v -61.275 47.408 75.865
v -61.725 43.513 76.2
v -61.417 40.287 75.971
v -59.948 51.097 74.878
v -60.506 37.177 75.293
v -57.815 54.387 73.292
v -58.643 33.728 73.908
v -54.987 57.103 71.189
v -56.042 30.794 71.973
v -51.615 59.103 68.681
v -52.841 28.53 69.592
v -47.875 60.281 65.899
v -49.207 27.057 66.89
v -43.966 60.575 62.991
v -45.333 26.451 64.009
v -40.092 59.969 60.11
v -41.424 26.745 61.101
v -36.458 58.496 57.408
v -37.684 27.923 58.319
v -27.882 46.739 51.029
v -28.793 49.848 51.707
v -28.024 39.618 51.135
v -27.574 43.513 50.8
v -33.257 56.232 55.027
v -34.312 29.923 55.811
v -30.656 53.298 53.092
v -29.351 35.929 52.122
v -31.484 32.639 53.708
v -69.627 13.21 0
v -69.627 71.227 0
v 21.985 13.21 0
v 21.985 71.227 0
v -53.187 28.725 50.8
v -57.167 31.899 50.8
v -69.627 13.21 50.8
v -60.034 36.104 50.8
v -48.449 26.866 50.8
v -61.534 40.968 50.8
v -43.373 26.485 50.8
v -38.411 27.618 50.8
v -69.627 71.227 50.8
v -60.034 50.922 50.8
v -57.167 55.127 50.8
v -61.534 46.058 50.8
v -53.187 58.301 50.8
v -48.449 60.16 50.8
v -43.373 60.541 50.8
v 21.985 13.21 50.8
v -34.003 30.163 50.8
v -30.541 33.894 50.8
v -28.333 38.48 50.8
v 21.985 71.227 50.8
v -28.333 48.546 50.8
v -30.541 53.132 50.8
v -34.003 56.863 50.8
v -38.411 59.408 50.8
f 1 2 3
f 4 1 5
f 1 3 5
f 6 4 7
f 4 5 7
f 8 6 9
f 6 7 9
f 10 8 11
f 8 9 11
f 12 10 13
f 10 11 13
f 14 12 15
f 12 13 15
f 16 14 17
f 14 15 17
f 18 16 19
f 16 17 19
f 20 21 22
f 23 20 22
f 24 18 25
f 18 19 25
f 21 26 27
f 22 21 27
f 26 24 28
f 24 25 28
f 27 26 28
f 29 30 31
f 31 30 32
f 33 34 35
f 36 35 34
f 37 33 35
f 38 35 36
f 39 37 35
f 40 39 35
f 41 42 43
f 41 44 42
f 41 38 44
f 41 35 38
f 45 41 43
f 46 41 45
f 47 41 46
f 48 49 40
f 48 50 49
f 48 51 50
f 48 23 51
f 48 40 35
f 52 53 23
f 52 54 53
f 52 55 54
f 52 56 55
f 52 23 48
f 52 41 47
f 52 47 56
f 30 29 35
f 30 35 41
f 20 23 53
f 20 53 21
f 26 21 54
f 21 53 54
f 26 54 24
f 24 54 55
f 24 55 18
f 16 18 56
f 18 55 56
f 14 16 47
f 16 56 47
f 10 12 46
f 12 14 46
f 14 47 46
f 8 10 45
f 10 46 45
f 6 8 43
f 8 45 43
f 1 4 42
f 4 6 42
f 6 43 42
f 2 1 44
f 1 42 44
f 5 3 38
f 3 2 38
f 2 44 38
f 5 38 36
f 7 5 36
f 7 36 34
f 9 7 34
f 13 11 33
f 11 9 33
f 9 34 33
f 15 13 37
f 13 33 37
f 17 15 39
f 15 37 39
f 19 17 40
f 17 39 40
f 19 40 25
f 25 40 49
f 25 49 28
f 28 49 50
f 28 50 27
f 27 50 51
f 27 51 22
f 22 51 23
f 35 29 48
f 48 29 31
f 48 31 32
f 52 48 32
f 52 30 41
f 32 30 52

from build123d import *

# Parameters (mm, degrees)
F0_W     = 91.6122980416
F0_H     = 58.0168142915
F1_DEPTH = 50.8
F2_R     = 17.0754278952
F3_DEPTH = 25.4
F4_DEPTH = 50.8
F6_DEPTH = 58.0178142915


with BuildPart() as f1:
    # F0 (on Top) → F1 (new body)
    with BuildSketch(Plane.XY):
        with Locations((-23.8212328404, 42.2187633812)):
            Rectangle(F0_W, F0_H)
    extrude(amount=F1_DEPTH)

    # F2 (on face) → F3 (join)
    with BuildSketch(Plane.XY.offset(50.8)):
        with Locations((-44.6495191595, 43.5129478574)):
            Circle(F2_R)
    extrude(amount=F3_DEPTH)

    # F4 (add): a face of the model
    f4_faces = [f1.faces().sort_by_distance(p)[0] for p in [
        (-19.4842586334, 41.9492815522, 50.8),
    ]]
    extrude(f4_faces, amount=-F4_DEPTH)

    # F5 (on face) → F6 (cut, through all)
    with BuildSketch(Plane.XZ.offset(-13.2103562355)):
        Polygon((-27.5740912643, 76.2), (-61.7249470548, 76.2), (-27.5740912643, 50.8), align=None)
    extrude(amount=-F6_DEPTH, mode=Mode.SUBTRACT)


solid = f1.part
